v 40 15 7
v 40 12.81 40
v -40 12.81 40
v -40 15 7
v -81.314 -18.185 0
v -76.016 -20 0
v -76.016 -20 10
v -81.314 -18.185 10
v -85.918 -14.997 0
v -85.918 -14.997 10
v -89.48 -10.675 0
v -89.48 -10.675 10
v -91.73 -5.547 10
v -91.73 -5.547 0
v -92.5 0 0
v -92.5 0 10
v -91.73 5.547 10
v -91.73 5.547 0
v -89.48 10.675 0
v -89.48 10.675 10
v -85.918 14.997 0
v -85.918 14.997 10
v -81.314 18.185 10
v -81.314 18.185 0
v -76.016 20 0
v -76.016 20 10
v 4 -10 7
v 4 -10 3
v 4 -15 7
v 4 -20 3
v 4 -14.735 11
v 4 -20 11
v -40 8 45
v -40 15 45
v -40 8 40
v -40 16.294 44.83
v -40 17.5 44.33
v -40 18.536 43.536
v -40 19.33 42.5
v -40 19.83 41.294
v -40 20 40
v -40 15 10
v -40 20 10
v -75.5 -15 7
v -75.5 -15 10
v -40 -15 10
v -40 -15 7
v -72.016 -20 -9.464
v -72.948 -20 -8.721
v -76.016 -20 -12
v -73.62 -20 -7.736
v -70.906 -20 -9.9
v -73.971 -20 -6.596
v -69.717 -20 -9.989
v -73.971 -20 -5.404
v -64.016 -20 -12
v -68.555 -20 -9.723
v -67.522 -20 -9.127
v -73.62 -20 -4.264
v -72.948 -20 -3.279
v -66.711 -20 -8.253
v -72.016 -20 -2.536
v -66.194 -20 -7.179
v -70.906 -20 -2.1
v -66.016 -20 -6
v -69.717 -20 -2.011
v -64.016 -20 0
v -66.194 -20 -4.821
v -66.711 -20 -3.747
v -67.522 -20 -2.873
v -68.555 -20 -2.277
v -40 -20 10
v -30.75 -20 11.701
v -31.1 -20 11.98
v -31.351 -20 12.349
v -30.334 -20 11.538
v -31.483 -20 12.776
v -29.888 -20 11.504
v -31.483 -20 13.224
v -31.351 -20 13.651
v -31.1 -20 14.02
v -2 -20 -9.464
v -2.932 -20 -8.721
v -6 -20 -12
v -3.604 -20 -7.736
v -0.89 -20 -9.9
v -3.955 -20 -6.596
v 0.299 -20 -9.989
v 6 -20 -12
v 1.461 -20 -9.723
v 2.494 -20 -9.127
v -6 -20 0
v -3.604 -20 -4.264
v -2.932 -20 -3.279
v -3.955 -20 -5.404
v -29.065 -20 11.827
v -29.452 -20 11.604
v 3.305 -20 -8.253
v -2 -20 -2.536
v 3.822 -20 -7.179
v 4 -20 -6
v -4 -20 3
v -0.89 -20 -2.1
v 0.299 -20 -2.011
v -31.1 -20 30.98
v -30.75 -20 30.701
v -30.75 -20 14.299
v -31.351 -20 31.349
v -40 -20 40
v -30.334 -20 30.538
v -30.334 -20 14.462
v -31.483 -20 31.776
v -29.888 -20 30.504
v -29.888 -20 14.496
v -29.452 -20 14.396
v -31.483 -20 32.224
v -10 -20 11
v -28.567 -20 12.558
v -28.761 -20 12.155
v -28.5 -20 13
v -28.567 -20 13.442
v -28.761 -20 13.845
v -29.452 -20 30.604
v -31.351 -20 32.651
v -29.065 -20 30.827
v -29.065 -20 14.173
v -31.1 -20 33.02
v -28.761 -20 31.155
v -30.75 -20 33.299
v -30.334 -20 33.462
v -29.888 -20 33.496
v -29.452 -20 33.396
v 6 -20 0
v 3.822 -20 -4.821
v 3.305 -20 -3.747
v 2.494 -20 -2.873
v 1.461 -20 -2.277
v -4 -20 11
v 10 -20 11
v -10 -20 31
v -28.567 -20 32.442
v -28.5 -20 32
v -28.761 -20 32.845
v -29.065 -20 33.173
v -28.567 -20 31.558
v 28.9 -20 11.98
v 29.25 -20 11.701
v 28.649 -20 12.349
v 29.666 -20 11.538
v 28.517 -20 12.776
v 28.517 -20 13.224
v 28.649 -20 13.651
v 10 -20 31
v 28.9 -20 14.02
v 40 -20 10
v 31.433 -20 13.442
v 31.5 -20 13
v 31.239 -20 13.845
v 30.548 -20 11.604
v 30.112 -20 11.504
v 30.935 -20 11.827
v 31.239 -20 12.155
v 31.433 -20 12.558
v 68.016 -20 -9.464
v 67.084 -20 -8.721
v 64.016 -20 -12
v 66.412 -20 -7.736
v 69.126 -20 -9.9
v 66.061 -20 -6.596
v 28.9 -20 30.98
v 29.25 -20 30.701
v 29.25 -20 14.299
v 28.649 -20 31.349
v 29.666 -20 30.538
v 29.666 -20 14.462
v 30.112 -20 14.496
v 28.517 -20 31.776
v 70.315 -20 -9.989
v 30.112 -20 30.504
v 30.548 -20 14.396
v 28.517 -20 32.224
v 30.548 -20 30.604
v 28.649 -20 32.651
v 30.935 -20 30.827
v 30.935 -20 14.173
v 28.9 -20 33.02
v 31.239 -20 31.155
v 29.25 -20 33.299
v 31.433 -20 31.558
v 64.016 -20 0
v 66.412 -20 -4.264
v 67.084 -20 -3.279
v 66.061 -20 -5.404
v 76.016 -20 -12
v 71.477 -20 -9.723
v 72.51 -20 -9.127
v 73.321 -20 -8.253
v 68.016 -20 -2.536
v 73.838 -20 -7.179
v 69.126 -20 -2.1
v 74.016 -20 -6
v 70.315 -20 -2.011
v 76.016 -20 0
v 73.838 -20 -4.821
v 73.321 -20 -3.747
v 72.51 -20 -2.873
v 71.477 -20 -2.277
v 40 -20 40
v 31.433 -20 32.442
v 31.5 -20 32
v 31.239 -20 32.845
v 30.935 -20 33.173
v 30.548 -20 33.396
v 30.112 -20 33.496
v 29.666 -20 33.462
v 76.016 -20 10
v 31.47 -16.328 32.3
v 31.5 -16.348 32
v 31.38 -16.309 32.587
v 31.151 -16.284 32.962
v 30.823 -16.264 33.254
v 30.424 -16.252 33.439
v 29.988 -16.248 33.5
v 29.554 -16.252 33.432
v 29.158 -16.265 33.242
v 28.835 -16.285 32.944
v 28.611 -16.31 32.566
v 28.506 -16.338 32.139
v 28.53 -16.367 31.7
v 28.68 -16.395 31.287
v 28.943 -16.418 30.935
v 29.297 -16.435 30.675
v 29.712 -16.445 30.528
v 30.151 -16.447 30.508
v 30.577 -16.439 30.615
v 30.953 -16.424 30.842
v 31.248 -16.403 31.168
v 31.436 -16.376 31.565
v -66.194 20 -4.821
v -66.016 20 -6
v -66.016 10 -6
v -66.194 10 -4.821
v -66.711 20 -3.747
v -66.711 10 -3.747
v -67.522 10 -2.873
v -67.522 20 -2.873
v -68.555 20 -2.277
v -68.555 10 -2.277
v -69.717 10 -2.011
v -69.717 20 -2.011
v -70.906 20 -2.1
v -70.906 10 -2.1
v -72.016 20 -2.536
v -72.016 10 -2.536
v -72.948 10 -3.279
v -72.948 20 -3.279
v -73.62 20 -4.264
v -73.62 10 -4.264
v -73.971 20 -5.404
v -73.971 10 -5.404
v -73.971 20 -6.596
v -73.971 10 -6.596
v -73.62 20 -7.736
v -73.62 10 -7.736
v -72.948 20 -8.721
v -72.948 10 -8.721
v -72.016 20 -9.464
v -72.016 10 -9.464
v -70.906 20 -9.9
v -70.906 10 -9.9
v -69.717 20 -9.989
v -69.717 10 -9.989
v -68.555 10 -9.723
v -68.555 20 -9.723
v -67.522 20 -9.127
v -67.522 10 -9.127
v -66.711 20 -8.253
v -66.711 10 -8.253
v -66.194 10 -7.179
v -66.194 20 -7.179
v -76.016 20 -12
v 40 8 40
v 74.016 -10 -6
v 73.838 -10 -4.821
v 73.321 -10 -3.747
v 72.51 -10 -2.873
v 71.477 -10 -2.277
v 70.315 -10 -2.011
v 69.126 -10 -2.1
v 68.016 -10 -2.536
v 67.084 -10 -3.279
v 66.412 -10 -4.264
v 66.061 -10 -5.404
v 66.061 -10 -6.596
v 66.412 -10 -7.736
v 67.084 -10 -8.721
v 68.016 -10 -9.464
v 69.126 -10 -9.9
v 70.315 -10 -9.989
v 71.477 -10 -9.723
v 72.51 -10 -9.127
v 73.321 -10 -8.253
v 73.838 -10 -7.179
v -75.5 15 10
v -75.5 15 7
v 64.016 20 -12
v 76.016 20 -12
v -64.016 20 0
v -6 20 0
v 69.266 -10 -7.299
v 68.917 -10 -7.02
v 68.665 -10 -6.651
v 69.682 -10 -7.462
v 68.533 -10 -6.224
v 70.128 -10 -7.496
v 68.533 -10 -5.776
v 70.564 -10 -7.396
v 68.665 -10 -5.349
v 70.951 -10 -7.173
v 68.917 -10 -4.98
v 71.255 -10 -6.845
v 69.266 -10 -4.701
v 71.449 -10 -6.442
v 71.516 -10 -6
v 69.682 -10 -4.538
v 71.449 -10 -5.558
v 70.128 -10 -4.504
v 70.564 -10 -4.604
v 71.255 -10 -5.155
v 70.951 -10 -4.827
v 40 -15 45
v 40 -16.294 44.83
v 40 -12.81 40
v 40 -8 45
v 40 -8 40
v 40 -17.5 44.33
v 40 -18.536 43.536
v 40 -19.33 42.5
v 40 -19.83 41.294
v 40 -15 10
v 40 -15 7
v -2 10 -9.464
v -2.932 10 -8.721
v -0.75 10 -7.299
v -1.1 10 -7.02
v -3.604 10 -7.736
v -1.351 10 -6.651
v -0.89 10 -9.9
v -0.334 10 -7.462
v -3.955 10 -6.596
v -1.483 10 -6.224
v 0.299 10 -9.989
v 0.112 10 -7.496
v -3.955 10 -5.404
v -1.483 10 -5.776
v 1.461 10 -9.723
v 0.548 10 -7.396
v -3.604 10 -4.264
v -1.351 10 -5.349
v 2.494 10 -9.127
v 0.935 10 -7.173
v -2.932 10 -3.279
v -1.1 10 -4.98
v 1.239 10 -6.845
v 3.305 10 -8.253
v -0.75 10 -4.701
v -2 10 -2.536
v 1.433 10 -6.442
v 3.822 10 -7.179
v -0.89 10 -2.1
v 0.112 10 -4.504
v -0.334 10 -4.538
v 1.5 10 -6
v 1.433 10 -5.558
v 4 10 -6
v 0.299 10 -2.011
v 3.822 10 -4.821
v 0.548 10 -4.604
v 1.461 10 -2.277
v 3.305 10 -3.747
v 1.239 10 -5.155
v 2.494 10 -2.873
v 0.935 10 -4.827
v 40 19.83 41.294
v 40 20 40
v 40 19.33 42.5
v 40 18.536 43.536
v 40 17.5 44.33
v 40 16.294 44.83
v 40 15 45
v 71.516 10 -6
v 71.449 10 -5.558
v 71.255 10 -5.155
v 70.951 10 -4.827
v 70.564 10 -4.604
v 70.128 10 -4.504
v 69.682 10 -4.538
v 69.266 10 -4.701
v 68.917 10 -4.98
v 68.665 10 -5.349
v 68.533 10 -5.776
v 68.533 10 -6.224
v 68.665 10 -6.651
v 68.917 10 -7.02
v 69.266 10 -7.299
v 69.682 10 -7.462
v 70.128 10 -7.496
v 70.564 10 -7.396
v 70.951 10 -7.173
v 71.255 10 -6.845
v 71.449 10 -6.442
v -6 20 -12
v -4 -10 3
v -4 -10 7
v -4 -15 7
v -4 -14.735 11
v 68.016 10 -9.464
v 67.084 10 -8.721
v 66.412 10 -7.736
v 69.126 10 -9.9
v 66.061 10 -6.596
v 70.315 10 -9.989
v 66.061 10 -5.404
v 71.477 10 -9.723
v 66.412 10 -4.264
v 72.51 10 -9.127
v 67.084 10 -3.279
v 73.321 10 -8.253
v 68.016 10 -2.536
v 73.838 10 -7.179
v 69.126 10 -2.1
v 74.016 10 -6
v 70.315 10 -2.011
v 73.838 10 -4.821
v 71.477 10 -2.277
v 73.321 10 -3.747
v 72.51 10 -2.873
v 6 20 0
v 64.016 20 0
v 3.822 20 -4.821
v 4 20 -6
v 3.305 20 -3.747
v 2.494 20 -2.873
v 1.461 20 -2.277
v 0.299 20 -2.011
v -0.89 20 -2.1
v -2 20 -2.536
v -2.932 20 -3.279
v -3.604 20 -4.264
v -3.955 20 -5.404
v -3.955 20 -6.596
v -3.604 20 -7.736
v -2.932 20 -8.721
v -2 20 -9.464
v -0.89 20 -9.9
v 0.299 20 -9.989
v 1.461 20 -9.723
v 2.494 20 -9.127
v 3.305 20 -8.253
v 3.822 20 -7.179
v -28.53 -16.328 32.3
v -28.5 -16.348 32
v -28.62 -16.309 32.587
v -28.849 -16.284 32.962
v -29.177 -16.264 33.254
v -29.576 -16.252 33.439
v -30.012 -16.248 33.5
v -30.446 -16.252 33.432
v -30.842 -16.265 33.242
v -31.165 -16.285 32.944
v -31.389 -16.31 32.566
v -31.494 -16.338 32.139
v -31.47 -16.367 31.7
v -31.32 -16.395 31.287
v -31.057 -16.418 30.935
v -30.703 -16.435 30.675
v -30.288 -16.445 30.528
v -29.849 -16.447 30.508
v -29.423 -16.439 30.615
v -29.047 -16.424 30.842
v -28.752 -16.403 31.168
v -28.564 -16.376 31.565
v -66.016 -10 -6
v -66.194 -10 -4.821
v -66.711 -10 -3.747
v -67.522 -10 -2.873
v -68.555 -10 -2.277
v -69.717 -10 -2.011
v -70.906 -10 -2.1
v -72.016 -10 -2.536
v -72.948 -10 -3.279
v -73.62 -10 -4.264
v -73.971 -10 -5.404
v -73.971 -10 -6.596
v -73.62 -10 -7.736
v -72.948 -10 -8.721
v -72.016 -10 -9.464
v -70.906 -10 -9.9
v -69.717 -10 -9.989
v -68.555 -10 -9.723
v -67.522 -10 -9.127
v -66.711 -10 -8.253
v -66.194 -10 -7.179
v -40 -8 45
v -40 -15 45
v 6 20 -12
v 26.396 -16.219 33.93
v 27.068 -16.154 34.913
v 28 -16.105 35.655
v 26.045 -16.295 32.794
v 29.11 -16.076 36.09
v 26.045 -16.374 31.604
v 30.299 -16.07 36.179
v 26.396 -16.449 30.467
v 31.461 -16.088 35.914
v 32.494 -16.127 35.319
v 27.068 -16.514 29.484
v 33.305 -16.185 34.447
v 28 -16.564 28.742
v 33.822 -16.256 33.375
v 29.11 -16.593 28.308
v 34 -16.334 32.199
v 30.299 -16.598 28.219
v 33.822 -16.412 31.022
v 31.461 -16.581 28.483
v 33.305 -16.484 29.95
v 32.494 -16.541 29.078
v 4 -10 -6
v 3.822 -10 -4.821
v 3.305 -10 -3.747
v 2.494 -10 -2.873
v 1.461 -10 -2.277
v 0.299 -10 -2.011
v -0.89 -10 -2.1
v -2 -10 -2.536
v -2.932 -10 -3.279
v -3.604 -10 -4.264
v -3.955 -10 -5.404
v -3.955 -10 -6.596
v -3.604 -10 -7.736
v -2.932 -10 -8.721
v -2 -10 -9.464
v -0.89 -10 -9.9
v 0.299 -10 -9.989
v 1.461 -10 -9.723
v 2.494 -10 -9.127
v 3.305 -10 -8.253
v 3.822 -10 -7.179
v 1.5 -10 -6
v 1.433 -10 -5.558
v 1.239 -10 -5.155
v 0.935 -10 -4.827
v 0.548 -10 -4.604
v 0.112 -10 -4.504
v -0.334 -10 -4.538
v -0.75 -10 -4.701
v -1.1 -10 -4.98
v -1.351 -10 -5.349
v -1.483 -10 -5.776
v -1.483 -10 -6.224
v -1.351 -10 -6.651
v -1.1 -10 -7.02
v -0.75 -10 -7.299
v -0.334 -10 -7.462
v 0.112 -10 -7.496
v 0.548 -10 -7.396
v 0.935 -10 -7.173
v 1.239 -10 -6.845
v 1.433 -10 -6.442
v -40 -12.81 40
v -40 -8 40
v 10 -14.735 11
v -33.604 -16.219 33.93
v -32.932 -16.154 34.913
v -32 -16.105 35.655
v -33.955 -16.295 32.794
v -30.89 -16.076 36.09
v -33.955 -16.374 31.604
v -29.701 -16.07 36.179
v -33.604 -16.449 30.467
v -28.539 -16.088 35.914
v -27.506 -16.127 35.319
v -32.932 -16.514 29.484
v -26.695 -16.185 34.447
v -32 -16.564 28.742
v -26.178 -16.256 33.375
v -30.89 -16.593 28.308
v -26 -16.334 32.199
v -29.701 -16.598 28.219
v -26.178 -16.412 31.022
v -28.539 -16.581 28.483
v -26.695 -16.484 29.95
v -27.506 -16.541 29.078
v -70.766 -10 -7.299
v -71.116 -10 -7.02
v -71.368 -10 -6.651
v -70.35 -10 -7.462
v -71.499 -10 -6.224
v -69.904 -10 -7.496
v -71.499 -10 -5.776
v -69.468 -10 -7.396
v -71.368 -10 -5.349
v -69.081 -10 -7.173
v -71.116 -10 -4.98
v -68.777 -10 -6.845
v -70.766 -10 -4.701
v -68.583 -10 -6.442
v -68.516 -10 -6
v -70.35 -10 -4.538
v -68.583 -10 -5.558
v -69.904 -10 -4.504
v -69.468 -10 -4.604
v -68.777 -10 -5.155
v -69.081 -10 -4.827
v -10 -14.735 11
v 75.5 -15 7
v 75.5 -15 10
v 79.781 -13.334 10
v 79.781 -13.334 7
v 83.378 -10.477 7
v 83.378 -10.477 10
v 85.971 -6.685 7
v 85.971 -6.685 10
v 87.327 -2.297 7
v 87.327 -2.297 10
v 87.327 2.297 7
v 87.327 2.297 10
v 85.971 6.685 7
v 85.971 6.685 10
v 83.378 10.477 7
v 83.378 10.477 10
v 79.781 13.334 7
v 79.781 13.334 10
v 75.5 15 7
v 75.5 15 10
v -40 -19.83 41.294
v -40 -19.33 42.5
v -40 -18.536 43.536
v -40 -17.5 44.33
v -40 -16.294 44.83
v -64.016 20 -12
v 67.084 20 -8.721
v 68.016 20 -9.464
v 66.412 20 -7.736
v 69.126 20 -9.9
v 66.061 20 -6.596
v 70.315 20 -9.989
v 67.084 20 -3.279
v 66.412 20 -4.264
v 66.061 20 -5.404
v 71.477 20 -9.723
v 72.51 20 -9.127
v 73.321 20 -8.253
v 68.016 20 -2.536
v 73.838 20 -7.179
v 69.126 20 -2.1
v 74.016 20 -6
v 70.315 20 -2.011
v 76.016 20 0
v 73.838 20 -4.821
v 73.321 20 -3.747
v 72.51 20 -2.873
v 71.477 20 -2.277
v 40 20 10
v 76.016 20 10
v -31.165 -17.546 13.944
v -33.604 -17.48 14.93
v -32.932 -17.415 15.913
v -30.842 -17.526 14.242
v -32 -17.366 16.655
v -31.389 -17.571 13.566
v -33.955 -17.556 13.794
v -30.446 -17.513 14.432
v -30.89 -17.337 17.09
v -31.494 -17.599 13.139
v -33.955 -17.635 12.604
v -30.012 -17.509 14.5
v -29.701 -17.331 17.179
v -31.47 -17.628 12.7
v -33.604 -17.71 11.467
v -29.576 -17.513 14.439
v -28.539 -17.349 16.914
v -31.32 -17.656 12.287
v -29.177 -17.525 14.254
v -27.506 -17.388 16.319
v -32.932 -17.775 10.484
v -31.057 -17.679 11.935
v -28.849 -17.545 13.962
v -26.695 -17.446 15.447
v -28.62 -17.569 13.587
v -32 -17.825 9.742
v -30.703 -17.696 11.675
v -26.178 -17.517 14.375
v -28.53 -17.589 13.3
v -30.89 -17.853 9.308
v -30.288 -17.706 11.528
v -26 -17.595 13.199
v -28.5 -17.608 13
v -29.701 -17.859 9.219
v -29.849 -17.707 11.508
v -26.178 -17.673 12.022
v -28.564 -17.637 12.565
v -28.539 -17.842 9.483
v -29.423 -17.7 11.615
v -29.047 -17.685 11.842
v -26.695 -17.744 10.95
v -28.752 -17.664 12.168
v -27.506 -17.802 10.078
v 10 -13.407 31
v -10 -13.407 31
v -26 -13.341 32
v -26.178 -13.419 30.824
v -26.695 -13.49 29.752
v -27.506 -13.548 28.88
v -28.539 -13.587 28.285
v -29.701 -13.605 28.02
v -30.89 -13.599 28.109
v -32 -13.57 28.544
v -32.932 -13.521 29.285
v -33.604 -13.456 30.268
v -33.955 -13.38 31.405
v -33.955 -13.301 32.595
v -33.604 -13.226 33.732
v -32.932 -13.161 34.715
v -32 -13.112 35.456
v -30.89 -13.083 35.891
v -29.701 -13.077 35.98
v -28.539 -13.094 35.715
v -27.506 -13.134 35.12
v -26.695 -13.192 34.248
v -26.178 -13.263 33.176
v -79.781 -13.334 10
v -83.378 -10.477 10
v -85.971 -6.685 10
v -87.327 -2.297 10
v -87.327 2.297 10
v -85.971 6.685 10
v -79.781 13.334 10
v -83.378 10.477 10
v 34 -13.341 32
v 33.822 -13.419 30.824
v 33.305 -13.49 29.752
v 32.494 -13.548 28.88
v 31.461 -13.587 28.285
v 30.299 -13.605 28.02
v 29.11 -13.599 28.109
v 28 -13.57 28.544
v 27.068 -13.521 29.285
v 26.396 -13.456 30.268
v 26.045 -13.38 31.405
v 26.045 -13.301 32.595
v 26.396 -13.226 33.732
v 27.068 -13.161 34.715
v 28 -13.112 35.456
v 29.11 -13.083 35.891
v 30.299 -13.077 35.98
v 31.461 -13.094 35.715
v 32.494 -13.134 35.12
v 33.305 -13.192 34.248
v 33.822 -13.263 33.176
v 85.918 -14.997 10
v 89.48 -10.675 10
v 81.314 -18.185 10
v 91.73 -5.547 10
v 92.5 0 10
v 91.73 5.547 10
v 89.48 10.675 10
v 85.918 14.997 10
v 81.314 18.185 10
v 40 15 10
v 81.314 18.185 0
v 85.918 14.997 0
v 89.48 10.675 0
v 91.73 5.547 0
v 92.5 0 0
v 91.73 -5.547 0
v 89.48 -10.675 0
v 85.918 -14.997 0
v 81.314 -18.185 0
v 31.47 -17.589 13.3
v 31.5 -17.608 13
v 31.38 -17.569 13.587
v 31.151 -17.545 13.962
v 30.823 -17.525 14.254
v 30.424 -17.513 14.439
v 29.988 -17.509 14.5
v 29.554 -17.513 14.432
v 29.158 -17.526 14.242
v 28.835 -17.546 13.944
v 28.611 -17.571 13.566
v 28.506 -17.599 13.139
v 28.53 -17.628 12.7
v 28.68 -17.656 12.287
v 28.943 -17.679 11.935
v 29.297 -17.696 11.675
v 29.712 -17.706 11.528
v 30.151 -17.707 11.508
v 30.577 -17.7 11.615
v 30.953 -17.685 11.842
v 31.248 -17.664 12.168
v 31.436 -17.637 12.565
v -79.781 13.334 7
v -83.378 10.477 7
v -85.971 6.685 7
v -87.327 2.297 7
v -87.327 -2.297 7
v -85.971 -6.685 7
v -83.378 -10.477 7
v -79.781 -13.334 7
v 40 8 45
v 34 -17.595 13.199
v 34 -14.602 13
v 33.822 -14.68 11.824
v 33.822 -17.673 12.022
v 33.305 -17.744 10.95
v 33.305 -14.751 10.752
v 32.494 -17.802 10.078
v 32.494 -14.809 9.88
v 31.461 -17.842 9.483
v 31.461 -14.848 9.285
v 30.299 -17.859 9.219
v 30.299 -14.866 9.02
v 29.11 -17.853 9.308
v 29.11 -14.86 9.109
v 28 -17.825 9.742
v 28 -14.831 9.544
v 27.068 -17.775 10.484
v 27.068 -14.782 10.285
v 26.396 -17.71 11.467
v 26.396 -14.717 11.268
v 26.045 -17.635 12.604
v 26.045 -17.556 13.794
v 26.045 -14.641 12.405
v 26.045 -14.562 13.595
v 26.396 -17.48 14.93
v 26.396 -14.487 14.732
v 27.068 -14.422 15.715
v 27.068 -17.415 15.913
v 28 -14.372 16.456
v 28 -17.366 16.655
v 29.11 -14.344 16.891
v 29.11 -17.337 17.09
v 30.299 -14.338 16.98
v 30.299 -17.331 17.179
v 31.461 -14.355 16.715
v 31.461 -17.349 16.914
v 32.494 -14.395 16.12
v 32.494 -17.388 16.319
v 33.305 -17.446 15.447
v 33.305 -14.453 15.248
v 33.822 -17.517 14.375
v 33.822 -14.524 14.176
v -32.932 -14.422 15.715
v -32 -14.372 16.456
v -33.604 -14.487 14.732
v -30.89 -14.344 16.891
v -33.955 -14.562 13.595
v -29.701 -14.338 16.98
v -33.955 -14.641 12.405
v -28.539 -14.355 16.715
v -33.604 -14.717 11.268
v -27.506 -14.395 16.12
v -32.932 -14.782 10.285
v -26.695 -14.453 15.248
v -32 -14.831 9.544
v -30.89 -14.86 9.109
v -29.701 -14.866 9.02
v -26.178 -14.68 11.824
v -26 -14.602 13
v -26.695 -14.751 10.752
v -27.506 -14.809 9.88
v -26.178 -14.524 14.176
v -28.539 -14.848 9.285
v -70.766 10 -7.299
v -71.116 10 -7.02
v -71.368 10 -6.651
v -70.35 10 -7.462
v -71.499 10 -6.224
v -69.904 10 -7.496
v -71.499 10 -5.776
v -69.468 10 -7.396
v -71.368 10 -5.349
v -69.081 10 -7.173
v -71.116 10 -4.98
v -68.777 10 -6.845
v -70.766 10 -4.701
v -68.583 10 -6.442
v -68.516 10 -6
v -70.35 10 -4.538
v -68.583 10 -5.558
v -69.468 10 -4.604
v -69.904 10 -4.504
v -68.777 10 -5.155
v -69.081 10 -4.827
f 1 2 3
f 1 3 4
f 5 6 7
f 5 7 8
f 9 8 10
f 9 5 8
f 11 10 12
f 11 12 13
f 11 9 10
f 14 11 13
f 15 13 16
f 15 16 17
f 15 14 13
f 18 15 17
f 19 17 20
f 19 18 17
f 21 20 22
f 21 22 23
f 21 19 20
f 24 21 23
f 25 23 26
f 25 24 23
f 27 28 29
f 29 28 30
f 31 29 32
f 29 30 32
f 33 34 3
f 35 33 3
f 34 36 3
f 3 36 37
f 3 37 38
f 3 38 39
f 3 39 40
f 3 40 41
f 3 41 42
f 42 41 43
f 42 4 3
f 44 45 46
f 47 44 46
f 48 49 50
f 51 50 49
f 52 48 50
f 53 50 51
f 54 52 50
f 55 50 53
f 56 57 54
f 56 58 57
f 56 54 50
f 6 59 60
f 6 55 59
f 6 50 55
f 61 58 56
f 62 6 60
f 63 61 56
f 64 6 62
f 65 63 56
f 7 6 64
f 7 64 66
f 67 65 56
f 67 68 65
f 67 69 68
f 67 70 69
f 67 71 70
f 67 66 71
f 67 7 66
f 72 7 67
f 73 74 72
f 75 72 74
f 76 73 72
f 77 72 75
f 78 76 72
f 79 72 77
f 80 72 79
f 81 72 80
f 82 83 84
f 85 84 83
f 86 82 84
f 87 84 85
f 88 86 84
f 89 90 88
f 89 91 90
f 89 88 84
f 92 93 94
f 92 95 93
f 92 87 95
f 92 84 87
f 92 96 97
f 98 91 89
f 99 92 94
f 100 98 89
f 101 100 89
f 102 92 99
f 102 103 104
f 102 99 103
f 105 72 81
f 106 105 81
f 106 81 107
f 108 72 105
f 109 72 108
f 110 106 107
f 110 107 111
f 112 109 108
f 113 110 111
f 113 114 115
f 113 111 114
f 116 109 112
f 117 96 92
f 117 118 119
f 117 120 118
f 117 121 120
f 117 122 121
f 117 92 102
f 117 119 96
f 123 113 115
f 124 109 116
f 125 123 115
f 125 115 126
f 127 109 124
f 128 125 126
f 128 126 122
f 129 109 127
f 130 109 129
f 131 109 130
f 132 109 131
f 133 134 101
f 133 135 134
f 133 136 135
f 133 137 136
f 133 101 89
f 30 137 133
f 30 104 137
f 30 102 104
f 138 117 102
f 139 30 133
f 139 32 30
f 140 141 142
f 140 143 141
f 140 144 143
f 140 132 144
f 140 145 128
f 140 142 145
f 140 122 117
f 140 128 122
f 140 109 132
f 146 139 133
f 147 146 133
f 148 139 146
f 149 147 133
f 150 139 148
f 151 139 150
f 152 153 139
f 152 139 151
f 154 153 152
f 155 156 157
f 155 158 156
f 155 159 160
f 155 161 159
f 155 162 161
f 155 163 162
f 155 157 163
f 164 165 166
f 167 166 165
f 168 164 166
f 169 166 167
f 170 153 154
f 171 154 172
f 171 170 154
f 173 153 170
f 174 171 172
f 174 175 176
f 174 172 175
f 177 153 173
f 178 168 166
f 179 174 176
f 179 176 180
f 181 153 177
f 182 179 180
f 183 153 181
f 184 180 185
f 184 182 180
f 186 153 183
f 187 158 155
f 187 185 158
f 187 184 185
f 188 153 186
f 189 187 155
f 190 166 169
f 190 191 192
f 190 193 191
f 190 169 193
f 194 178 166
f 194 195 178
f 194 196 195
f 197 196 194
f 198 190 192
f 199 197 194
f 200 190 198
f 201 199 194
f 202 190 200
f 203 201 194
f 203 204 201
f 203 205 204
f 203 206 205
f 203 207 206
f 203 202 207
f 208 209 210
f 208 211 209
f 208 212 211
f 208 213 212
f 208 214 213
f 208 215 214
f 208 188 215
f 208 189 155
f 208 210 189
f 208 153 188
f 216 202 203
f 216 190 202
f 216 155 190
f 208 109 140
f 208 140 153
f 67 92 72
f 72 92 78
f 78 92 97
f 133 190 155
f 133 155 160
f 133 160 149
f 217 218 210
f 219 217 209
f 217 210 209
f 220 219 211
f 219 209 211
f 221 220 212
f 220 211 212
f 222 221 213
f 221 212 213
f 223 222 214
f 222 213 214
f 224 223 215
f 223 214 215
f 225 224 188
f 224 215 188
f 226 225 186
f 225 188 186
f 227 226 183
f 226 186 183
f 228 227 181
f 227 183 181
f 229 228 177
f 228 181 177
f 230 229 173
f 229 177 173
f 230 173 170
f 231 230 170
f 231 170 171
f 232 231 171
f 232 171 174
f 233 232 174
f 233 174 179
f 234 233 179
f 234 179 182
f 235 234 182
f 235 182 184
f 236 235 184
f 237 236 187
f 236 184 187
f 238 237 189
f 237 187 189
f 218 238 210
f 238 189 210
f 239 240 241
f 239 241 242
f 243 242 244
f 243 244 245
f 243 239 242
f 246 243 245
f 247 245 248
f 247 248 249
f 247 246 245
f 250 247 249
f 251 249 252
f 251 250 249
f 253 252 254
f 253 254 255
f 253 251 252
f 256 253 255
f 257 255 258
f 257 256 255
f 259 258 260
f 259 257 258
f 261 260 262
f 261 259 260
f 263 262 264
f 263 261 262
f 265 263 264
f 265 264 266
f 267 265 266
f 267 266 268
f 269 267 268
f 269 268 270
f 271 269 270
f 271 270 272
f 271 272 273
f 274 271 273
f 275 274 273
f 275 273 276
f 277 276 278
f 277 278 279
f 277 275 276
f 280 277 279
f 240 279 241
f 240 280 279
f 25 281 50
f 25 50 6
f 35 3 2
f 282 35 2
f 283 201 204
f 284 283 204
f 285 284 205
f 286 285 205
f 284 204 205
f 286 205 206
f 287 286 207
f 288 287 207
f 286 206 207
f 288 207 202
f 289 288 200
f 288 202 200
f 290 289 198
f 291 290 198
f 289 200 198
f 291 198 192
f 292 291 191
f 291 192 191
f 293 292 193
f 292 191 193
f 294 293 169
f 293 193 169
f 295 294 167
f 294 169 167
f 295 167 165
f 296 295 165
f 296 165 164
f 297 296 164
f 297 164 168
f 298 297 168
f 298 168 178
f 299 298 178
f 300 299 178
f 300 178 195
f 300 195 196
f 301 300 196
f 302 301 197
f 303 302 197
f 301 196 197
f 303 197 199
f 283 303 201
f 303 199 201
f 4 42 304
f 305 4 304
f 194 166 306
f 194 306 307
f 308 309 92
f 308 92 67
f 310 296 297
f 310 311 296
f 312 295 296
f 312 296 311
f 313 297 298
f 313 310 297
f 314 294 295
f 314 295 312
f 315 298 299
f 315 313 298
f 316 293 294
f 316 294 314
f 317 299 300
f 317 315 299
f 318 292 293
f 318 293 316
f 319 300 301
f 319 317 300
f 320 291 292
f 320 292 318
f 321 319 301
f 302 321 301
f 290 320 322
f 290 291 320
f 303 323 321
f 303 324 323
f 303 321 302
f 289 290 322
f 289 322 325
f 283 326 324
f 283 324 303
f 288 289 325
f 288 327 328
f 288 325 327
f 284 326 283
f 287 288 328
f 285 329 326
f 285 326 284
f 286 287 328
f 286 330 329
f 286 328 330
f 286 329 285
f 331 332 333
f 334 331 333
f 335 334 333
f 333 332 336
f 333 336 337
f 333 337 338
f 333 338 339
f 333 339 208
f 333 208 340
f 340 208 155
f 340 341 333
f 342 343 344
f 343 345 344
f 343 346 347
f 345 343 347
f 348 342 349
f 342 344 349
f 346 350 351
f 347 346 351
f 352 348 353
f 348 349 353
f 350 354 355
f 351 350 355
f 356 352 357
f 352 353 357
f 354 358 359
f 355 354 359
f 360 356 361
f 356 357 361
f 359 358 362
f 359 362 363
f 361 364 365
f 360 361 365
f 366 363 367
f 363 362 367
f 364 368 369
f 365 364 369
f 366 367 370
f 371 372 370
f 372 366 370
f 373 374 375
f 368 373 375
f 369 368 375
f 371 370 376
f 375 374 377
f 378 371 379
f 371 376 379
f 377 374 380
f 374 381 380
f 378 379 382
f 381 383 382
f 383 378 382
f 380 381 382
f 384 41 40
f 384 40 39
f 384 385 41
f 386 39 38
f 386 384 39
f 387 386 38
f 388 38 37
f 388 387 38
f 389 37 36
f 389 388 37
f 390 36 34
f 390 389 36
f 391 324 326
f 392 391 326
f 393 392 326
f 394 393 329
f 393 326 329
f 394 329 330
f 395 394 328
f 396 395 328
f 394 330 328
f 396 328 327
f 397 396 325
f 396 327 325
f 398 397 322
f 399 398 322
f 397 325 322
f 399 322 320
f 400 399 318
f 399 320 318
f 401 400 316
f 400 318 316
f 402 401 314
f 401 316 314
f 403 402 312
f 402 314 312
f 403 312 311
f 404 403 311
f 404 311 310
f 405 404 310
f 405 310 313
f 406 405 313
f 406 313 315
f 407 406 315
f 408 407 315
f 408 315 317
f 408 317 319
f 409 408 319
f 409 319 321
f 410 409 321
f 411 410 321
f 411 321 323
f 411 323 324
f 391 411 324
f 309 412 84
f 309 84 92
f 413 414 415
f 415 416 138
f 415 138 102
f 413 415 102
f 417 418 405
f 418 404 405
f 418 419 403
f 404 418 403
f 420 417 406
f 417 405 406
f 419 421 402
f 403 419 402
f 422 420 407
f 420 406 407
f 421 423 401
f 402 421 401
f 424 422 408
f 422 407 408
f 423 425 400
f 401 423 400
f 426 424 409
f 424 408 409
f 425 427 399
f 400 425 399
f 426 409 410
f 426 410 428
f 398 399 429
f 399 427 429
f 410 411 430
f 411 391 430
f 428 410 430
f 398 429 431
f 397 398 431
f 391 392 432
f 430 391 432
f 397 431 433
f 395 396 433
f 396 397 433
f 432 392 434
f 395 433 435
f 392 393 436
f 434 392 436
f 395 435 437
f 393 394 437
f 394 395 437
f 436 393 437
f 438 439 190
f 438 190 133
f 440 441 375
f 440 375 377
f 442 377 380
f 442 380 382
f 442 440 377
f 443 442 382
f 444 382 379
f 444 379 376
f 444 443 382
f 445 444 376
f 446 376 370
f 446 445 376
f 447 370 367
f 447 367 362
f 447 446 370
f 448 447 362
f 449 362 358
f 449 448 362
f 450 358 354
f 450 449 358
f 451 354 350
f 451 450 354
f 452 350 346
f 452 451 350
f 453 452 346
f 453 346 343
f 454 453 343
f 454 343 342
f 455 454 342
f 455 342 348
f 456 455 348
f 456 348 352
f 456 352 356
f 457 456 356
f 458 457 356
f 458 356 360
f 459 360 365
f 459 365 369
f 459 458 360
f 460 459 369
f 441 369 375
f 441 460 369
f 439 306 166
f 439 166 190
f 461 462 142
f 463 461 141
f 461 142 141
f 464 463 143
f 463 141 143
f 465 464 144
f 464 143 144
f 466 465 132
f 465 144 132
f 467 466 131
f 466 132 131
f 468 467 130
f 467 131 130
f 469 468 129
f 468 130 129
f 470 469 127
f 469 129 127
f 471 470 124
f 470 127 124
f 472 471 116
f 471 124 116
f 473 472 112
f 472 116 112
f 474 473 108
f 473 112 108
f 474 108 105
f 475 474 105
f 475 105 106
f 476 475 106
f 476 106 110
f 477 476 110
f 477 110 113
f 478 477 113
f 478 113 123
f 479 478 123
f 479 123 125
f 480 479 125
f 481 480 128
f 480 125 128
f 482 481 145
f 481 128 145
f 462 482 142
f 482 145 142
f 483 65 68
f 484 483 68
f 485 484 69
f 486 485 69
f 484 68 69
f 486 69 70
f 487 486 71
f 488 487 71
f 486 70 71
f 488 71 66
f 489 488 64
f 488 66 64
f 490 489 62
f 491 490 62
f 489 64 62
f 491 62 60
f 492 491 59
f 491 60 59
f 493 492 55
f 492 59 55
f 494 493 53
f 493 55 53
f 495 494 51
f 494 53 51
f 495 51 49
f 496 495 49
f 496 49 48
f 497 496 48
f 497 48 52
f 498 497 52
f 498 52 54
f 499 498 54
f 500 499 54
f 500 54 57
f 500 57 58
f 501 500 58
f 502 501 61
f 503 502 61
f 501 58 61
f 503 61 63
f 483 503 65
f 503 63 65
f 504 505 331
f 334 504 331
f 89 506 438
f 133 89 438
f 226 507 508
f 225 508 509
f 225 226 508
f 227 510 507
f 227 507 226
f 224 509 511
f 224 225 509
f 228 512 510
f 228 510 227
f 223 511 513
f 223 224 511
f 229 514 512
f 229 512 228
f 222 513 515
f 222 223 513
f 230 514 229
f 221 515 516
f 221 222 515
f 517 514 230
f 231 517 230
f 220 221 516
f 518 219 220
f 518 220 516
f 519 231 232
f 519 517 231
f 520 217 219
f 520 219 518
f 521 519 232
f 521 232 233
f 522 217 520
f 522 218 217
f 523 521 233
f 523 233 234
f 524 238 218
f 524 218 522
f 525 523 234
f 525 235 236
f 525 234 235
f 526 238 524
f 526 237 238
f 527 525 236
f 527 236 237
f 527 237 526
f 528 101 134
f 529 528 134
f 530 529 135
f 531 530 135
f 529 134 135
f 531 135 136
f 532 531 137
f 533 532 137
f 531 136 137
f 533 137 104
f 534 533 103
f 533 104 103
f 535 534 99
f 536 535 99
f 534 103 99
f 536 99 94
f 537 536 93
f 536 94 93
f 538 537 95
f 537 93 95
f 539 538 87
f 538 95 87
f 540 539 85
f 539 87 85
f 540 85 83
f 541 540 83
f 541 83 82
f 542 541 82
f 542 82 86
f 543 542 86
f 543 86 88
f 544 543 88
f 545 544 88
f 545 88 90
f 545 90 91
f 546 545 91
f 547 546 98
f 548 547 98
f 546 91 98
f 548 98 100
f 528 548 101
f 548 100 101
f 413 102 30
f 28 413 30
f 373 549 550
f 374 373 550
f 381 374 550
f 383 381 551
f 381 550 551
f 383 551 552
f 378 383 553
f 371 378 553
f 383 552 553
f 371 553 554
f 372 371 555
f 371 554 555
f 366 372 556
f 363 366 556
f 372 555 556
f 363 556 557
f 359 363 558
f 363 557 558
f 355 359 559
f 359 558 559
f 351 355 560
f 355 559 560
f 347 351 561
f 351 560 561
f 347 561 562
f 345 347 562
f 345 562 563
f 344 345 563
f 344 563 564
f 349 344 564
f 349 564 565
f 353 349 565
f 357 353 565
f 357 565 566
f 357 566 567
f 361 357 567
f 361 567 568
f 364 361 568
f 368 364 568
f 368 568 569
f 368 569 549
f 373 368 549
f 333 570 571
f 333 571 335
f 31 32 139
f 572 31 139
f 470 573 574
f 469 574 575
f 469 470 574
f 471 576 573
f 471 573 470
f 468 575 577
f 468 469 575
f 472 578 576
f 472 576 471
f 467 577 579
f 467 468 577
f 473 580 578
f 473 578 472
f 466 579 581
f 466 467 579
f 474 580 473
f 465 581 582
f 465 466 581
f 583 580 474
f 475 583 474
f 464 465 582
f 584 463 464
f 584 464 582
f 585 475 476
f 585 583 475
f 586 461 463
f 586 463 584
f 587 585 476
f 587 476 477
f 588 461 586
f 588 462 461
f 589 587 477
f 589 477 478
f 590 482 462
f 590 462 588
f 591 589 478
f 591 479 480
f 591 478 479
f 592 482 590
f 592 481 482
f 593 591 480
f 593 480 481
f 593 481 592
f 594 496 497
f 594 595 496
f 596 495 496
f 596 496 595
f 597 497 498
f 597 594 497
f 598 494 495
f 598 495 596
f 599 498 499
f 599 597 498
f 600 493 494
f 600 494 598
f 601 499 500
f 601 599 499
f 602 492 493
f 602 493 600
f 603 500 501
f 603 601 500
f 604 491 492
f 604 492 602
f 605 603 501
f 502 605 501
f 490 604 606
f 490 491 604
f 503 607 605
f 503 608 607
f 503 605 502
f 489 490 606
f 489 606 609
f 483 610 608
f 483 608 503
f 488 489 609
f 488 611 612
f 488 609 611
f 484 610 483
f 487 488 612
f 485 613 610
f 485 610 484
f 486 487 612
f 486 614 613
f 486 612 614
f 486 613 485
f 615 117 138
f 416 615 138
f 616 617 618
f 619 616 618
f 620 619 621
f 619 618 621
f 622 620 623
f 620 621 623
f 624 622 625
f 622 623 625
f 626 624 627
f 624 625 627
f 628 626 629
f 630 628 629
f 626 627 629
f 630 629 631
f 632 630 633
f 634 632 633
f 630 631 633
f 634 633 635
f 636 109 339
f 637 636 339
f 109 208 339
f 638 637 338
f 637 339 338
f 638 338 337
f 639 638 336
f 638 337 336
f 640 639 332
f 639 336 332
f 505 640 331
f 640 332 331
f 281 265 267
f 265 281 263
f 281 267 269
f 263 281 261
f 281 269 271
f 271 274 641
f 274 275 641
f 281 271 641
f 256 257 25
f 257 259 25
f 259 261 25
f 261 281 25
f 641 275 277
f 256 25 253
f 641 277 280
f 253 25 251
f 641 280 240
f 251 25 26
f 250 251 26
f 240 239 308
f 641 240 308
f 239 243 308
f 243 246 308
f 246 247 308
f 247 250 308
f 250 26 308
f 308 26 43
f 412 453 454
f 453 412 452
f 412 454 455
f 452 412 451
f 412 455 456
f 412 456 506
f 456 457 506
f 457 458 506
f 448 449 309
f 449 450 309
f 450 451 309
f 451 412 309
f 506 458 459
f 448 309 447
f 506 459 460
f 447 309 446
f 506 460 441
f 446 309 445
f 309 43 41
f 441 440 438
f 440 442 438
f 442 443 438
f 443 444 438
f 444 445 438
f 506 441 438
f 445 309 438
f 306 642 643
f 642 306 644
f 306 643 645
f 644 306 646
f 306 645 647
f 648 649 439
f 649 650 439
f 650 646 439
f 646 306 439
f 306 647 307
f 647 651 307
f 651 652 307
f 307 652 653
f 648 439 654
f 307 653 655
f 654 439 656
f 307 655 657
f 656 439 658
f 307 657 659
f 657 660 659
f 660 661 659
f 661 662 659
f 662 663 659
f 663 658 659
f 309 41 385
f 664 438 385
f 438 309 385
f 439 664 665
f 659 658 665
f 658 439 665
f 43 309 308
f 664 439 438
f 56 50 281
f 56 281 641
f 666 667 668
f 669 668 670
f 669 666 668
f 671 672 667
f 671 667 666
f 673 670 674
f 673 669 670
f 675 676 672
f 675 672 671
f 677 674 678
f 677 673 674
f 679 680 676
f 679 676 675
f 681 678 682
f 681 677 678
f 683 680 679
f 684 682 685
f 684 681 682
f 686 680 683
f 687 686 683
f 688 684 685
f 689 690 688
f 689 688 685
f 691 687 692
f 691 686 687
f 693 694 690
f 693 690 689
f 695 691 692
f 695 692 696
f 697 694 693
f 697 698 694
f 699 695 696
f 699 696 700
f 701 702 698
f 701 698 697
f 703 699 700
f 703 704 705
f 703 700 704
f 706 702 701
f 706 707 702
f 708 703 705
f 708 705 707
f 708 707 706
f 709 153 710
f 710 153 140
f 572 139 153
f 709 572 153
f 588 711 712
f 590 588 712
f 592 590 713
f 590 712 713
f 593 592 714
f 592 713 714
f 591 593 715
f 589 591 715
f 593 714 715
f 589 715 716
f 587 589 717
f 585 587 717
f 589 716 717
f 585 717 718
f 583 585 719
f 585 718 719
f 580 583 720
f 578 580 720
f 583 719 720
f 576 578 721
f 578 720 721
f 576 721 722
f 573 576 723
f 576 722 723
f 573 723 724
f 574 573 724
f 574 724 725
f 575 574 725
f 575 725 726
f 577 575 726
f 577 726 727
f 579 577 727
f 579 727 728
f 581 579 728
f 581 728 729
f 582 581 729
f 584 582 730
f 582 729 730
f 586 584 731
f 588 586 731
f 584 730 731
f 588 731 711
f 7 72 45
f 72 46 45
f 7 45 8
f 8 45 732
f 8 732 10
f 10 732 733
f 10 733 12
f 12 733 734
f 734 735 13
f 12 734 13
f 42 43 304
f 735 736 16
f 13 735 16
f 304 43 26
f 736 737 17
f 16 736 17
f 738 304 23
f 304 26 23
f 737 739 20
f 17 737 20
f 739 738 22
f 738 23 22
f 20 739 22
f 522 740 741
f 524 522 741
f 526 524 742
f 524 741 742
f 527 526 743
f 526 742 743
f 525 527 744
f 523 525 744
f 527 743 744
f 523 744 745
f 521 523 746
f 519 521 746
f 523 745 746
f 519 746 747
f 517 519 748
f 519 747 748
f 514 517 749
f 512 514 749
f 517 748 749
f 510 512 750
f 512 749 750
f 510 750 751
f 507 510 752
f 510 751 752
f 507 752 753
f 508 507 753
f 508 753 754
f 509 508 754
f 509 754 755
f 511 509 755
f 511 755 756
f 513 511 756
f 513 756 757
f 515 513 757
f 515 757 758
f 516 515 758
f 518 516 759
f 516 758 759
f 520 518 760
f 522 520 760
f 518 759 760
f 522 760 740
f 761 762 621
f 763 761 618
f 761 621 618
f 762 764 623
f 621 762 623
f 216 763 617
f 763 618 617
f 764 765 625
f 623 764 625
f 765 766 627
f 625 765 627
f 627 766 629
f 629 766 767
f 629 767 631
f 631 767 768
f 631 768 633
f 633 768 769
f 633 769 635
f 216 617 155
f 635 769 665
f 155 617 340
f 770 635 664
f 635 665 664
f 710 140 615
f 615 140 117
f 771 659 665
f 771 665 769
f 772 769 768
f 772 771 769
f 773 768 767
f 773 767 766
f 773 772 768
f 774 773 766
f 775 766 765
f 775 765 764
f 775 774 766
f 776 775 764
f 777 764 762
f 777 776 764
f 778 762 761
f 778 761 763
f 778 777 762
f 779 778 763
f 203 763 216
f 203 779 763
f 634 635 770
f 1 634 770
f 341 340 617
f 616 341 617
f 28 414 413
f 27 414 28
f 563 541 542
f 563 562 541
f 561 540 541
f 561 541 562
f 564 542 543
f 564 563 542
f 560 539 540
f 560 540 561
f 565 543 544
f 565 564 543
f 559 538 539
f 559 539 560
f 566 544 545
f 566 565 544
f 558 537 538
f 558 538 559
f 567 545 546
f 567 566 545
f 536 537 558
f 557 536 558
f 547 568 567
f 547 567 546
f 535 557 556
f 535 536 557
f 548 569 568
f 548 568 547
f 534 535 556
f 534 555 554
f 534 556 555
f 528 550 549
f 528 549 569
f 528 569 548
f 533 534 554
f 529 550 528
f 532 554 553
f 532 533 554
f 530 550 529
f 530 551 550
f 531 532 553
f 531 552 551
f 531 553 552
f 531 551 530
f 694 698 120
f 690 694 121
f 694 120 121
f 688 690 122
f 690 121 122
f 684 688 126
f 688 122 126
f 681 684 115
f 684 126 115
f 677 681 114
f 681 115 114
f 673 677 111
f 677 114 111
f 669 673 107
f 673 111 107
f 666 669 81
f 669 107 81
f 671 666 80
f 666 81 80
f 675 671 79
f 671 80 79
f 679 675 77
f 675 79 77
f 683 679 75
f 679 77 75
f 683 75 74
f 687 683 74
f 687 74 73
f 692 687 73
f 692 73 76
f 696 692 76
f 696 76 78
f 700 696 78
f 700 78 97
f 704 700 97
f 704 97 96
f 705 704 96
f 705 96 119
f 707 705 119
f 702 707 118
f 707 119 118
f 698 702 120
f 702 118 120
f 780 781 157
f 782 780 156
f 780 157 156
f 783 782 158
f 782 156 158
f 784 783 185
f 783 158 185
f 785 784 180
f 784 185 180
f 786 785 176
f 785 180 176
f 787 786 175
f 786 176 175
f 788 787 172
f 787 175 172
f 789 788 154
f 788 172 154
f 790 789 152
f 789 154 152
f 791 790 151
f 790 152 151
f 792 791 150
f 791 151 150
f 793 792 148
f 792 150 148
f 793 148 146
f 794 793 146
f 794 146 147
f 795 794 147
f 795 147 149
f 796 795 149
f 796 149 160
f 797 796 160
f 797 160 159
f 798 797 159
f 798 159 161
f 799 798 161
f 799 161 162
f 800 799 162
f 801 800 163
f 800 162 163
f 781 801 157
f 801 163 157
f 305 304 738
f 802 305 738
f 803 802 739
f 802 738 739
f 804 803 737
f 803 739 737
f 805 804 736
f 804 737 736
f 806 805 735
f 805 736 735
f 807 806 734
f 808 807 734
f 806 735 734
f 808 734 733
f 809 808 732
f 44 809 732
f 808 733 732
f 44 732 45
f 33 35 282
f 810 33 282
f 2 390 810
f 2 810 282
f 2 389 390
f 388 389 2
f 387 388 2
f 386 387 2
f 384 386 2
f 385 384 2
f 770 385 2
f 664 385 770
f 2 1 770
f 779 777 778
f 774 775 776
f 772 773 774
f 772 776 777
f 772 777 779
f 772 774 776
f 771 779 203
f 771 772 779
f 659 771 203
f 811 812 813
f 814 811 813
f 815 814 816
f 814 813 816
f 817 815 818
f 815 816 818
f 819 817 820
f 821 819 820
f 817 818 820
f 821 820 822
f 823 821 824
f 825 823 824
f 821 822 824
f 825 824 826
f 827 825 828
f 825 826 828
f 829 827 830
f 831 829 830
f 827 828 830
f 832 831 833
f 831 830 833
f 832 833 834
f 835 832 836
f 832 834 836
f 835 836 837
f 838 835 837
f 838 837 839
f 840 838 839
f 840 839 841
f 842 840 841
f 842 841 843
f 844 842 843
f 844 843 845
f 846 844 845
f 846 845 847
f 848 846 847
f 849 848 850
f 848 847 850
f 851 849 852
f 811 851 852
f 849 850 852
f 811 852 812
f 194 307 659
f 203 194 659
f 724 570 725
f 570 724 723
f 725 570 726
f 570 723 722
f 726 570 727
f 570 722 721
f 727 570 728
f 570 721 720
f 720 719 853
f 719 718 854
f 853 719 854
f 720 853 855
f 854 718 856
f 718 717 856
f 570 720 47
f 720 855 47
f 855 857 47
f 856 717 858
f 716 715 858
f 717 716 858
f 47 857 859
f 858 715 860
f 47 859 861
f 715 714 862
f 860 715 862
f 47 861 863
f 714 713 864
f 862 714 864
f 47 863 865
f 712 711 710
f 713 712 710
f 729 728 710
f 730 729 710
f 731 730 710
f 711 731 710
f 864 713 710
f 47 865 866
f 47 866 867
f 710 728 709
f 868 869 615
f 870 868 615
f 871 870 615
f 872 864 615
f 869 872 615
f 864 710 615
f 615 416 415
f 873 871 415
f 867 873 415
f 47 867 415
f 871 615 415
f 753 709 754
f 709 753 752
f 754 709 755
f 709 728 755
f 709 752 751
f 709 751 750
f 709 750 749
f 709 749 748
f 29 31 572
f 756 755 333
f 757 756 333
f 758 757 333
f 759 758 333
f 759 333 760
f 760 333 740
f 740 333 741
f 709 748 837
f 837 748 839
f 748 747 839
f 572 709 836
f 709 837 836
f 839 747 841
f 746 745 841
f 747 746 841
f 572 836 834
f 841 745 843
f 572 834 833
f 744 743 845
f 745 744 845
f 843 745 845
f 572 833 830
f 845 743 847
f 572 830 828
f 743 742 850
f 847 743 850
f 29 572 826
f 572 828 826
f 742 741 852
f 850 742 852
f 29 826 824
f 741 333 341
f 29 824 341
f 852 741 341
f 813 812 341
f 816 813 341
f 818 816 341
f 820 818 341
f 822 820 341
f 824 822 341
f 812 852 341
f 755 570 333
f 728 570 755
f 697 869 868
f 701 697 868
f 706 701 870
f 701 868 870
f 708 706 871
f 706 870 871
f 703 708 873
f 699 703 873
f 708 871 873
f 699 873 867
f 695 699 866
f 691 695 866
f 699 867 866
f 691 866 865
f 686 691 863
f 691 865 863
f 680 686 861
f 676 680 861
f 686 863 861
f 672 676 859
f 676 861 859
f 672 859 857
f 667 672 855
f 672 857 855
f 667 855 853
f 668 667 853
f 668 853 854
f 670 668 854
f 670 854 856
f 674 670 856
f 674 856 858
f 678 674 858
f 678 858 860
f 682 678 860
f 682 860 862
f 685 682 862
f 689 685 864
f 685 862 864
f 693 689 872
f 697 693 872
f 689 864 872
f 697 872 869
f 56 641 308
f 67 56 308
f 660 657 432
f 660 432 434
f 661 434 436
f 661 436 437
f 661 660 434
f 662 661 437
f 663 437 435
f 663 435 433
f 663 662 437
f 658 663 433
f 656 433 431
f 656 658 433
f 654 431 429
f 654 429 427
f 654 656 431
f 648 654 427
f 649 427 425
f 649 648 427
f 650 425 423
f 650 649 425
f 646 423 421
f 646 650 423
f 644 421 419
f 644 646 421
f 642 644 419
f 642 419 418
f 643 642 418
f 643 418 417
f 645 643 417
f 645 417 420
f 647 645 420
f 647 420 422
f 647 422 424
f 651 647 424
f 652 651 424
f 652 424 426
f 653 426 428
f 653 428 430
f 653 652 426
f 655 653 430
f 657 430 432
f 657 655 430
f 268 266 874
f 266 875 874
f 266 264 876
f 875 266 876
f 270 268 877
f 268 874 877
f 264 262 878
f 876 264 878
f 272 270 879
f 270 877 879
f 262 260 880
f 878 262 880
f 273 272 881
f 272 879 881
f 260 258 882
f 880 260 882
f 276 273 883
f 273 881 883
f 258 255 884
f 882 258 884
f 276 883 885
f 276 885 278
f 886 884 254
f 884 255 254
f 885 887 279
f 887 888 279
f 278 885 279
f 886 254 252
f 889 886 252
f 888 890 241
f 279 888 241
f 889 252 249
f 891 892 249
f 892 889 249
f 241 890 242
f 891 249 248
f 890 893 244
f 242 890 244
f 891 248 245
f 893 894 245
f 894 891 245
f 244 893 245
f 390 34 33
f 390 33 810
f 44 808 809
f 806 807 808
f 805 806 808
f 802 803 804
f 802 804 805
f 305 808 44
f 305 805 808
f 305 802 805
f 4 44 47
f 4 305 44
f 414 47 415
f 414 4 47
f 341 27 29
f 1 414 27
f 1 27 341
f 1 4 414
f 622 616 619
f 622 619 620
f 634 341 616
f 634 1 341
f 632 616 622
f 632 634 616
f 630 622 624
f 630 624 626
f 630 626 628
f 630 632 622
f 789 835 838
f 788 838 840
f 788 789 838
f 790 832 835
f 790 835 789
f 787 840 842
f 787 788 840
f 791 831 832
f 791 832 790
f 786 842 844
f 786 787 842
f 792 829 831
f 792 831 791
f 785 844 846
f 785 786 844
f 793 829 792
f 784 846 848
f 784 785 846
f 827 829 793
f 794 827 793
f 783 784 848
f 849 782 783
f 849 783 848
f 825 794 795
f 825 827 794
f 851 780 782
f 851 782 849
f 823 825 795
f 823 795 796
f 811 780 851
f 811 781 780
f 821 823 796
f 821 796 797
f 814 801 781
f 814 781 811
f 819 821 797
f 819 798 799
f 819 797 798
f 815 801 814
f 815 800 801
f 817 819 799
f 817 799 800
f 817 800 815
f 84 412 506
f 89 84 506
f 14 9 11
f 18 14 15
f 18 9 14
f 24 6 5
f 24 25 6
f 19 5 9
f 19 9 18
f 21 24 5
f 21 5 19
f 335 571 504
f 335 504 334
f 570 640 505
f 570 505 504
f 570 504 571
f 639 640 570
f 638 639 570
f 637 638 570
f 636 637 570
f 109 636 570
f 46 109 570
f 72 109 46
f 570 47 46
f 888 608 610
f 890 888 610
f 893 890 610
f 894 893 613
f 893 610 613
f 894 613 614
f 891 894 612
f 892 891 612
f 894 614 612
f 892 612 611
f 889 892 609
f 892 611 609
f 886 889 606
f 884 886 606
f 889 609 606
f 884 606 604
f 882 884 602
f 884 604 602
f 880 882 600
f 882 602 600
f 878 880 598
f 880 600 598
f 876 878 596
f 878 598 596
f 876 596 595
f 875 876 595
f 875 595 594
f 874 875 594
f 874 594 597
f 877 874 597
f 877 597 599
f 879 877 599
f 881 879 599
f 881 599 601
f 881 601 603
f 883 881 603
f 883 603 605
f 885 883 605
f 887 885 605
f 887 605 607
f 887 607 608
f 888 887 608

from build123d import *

# Parameters (mm, degrees)
ESTRUSIONE_ESTRUSIONE1_DEPTH  = 10
TAGLIO_ESTRUSIONE1_DEPTH      = 3
SCHIZZO4_W                    = 80
SCHIZZO4_H                    = 5
ESTRUSIONE_ESTRUSIONE2_DEPTH  = 35
ESTRUSIONE_ESTRUSIONE4_DEPTH  = 80
SCHIZZO7_W                    = 80
SCHIZZO7_H                    = 5
ESTRUSIONE_ESTRUSIONE5_DEPTH  = 7
TAGLIO_ESTRUSIONE2_REACH      = 42
SCHIZZO8_R                    = 1.5
RACCORDO1_R                   = 5
RACCORDO2_R                   = 5
TAGLIO_ESTRUSIONE3_DEPTH      = 1
TAGLIO_ESTRUSIONE3_DEPTH_BACK = 10
SCHIZZO11_R                   = 4
TAGLIO_ESTRUSIONE4_DEPTH      = 3
SCHIZZO12_W                   = 12
SCHIZZO12_H                   = 12
ESTRUSIONE_ESTRUSIONE6_DEPTH  = 40
SCHIZZO13_R                   = 1.5
TAGLIO_ESTRUSIONE5_DEPTH      = 41
SCHIZZO14_R                   = 4
TAGLIO_ESTRUSIONE6_DEPTH      = 10


with BuildPart() as part:
    # Schizzo1 → Estrusione-Estrusione1 (new body)
    with BuildSketch(Plane.XY):
        with BuildLine():
            Line((-76.016095604, 20), (76.016095604, 20))
            ThreePointArc((76.016095604, 20), (92.5, 0), (76.016095604, -20))
            Line((76.016095604, -20), (-76.016095604, -20))
            ThreePointArc((-76.016095604, -20), (-92.5, 0), (-76.016095604, 20))
        make_face()
    extrude(amount=ESTRUSIONE_ESTRUSIONE1_DEPTH)

    # Schizzo3 → Taglio-Estrusione1 (cut)
    with BuildSketch(Plane.XY.offset(10)):
        with BuildLine():
            Line((-75.5, -15), (75.5, -15))
            ThreePointArc((75.5, -15), (87.5, 0), (75.5, 15))
            Line((75.5, 15), (-75.5, 15))
            ThreePointArc((-75.5, 15), (-87.5, 0), (-75.5, -15))
        make_face()
    extrude(amount=-TAGLIO_ESTRUSIONE1_DEPTH, mode=Mode.SUBTRACT)

    # Schizzo4 → Estrusione-Estrusione2 (add)
    with BuildSketch(Plane.XY.offset(10)):
        with Locations((0, -17.5)):
            Rectangle(SCHIZZO4_W, SCHIZZO4_H)
    estrusione_estrusione2 = extrude(amount=ESTRUSIONE_ESTRUSIONE2_DEPTH)

    # Schizzo6 → Estrusione-Estrusione4 (add)
    with BuildSketch(Plane(origin=(40, 0, 0), x_dir=(0, 0, -1), z_dir=(1, 0, 0))):
        Polygon((-40, -15), (-40, -12.81), (-7, -15), align=None)
    estrusione_estrusione4 = extrude(amount=-ESTRUSIONE_ESTRUSIONE4_DEPTH)

    # Schizzo7 → Estrusione-Estrusione5 (add)
    with BuildSketch(Plane(origin=(0, -15, 0), x_dir=(1, 0, 0), z_dir=(0, 1, 0))):
        with Locations((0, -42.5)):
            Rectangle(SCHIZZO7_W, SCHIZZO7_H)
    estrusione_estrusione5 = extrude(amount=ESTRUSIONE_ESTRUSIONE5_DEPTH)

    # Schizzo8 → Taglio-Estrusione2 (cut, up to next)
    with BuildSketch(Plane.XZ.offset(20), mode=Mode.PRIVATE) as taglio_estrusione2_sk1:
        with Locations((-30, 13)):
            Circle(SCHIZZO8_R)
    taglio_estrusione2_tool1 = extrude(taglio_estrusione2_sk1.sketch, amount=-TAGLIO_ESTRUSIONE2_REACH, mode=Mode.PRIVATE) & part.part
    add(taglio_estrusione2_tool1.solids().sort_by_distance((-30, -20, 13))[0], mode=Mode.SUBTRACT)
    # Schizzo8 → Taglio-Estrusione2 (cut, up to next)
    with BuildSketch(Plane.XZ.offset(20), mode=Mode.PRIVATE) as taglio_estrusione2_sk2:
        with Locations((-30, 32)):
            Circle(SCHIZZO8_R)
    taglio_estrusione2_tool2 = extrude(taglio_estrusione2_sk2.sketch, amount=-TAGLIO_ESTRUSIONE2_REACH, mode=Mode.PRIVATE) & part.part
    add(taglio_estrusione2_tool2.solids().sort_by_distance((-30, -20, 32))[0], mode=Mode.SUBTRACT)
    # Schizzo8 → Taglio-Estrusione2 (cut, up to next)
    with BuildSketch(Plane.XZ.offset(20), mode=Mode.PRIVATE) as taglio_estrusione2_sk3:
        with Locations((30, 13)):
            Circle(SCHIZZO8_R)
    taglio_estrusione2_tool3 = extrude(taglio_estrusione2_sk3.sketch, amount=-TAGLIO_ESTRUSIONE2_REACH, mode=Mode.PRIVATE) & part.part
    add(taglio_estrusione2_tool3.solids().sort_by_distance((30, -20, 13))[0], mode=Mode.SUBTRACT)
    # Schizzo8 → Taglio-Estrusione2 (cut, up to next)
    with BuildSketch(Plane.XZ.offset(20), mode=Mode.PRIVATE) as taglio_estrusione2_sk4:
        with Locations((30, 32)):
            Circle(SCHIZZO8_R)
    taglio_estrusione2_tool4 = extrude(taglio_estrusione2_sk4.sketch, amount=-TAGLIO_ESTRUSIONE2_REACH, mode=Mode.PRIVATE) & part.part
    add(taglio_estrusione2_tool4.solids().sort_by_distance((30, -20, 32))[0], mode=Mode.SUBTRACT)

    # Specchia1: Estrusione-Estrusione2, Estrusione-Estrusione4, Estrusione-Estrusione5 across plane
    add(estrusione_estrusione2.mirror(Plane.ZX))
    add(estrusione_estrusione4.mirror(Plane.ZX))
    add(estrusione_estrusione5.mirror(Plane.ZX))

    # Raccordo1
    raccordo1_edges = [part.edges().sort_by_distance(p)[0] for p in [
        (0, -20, 45),
    ]]
    fillet(raccordo1_edges, radius=RACCORDO1_R)

    # Raccordo2
    raccordo2_edges = [part.edges().sort_by_distance(p)[0] for p in [
        (0, 20, 45),
    ]]
    fillet(raccordo2_edges, radius=RACCORDO2_R)

    # Schizzo9 → Taglio-Estrusione3 (cut, two sides)
    with BuildSketch(Plane.XZ.offset(20)) as taglio_estrusione3_sk:
        Polygon((-4, 11), (-4, 3), (4, 3), (4, 11), (10, 11), (10, 31), (-10, 31), (-10, 11), align=None)
    extrude(amount=TAGLIO_ESTRUSIONE3_DEPTH, mode=Mode.SUBTRACT)
    extrude(taglio_estrusione3_sk.sketch, amount=-TAGLIO_ESTRUSIONE3_DEPTH_BACK, mode=Mode.SUBTRACT)

    # Schizzo11 → Taglio-Estrusione4 (cut)
    with BuildSketch(Plane(origin=(0, -15.396736192, 1.021783402), x_dir=(1, 0, 0), z_dir=(0, 0.997805181, -0.06621798))):
        with Locations((-30, -12.004564445)):
            Circle(SCHIZZO11_R)
        with Locations((-30, -31.046357736)):
            Circle(SCHIZZO11_R)
        with Locations((30, -31.046357736)):
            Circle(SCHIZZO11_R)
        with Locations((30, -12.004564445)):
            Circle(SCHIZZO11_R)
    extrude(amount=-TAGLIO_ESTRUSIONE4_DEPTH, mode=Mode.SUBTRACT)

    # Schizzo12 → Estrusione-Estrusione6 (add)
    with BuildSketch(Plane.XZ.offset(20)):
        with Locations((70.016095604, -6)):
            Rectangle(SCHIZZO12_W, SCHIZZO12_H)
        with Locations((-70.016095604, -6)):
            Rectangle(SCHIZZO12_W, SCHIZZO12_H)
        with Locations((0, -6)):
            Rectangle(SCHIZZO12_W, SCHIZZO12_H)
    extrude(amount=-ESTRUSIONE_ESTRUSIONE6_DEPTH)

    # Schizzo13 → Taglio-Estrusione5 (cut, through all)
    with BuildSketch(Plane.XZ.offset(20)):
        with Locations((-70.016095604, -6)):
            Circle(SCHIZZO13_R)
        with Locations((0, -6)):
            Circle(SCHIZZO13_R)
        with Locations((70.016095604, -6)):
            Circle(SCHIZZO13_R)
    extrude(amount=-TAGLIO_ESTRUSIONE5_DEPTH, mode=Mode.SUBTRACT)

    # Schizzo14 → Taglio-Estrusione6 (cut)
    with BuildSketch(Plane.XZ.offset(20)):
        with Locations((-70.016095604, -6)):
            Circle(SCHIZZO14_R)
        with Locations((0, -6)):
            Circle(SCHIZZO14_R)
        with Locations((70.016095604, -6)):
            Circle(SCHIZZO14_R)
    taglio_estrusione6 = extrude(amount=-TAGLIO_ESTRUSIONE6_DEPTH, mode=Mode.SUBTRACT)

    # Specchia2: Taglio-Estrusione6 across plane
    add(taglio_estrusione6.mirror(Plane.ZX), mode=Mode.SUBTRACT)


solid = part.part
